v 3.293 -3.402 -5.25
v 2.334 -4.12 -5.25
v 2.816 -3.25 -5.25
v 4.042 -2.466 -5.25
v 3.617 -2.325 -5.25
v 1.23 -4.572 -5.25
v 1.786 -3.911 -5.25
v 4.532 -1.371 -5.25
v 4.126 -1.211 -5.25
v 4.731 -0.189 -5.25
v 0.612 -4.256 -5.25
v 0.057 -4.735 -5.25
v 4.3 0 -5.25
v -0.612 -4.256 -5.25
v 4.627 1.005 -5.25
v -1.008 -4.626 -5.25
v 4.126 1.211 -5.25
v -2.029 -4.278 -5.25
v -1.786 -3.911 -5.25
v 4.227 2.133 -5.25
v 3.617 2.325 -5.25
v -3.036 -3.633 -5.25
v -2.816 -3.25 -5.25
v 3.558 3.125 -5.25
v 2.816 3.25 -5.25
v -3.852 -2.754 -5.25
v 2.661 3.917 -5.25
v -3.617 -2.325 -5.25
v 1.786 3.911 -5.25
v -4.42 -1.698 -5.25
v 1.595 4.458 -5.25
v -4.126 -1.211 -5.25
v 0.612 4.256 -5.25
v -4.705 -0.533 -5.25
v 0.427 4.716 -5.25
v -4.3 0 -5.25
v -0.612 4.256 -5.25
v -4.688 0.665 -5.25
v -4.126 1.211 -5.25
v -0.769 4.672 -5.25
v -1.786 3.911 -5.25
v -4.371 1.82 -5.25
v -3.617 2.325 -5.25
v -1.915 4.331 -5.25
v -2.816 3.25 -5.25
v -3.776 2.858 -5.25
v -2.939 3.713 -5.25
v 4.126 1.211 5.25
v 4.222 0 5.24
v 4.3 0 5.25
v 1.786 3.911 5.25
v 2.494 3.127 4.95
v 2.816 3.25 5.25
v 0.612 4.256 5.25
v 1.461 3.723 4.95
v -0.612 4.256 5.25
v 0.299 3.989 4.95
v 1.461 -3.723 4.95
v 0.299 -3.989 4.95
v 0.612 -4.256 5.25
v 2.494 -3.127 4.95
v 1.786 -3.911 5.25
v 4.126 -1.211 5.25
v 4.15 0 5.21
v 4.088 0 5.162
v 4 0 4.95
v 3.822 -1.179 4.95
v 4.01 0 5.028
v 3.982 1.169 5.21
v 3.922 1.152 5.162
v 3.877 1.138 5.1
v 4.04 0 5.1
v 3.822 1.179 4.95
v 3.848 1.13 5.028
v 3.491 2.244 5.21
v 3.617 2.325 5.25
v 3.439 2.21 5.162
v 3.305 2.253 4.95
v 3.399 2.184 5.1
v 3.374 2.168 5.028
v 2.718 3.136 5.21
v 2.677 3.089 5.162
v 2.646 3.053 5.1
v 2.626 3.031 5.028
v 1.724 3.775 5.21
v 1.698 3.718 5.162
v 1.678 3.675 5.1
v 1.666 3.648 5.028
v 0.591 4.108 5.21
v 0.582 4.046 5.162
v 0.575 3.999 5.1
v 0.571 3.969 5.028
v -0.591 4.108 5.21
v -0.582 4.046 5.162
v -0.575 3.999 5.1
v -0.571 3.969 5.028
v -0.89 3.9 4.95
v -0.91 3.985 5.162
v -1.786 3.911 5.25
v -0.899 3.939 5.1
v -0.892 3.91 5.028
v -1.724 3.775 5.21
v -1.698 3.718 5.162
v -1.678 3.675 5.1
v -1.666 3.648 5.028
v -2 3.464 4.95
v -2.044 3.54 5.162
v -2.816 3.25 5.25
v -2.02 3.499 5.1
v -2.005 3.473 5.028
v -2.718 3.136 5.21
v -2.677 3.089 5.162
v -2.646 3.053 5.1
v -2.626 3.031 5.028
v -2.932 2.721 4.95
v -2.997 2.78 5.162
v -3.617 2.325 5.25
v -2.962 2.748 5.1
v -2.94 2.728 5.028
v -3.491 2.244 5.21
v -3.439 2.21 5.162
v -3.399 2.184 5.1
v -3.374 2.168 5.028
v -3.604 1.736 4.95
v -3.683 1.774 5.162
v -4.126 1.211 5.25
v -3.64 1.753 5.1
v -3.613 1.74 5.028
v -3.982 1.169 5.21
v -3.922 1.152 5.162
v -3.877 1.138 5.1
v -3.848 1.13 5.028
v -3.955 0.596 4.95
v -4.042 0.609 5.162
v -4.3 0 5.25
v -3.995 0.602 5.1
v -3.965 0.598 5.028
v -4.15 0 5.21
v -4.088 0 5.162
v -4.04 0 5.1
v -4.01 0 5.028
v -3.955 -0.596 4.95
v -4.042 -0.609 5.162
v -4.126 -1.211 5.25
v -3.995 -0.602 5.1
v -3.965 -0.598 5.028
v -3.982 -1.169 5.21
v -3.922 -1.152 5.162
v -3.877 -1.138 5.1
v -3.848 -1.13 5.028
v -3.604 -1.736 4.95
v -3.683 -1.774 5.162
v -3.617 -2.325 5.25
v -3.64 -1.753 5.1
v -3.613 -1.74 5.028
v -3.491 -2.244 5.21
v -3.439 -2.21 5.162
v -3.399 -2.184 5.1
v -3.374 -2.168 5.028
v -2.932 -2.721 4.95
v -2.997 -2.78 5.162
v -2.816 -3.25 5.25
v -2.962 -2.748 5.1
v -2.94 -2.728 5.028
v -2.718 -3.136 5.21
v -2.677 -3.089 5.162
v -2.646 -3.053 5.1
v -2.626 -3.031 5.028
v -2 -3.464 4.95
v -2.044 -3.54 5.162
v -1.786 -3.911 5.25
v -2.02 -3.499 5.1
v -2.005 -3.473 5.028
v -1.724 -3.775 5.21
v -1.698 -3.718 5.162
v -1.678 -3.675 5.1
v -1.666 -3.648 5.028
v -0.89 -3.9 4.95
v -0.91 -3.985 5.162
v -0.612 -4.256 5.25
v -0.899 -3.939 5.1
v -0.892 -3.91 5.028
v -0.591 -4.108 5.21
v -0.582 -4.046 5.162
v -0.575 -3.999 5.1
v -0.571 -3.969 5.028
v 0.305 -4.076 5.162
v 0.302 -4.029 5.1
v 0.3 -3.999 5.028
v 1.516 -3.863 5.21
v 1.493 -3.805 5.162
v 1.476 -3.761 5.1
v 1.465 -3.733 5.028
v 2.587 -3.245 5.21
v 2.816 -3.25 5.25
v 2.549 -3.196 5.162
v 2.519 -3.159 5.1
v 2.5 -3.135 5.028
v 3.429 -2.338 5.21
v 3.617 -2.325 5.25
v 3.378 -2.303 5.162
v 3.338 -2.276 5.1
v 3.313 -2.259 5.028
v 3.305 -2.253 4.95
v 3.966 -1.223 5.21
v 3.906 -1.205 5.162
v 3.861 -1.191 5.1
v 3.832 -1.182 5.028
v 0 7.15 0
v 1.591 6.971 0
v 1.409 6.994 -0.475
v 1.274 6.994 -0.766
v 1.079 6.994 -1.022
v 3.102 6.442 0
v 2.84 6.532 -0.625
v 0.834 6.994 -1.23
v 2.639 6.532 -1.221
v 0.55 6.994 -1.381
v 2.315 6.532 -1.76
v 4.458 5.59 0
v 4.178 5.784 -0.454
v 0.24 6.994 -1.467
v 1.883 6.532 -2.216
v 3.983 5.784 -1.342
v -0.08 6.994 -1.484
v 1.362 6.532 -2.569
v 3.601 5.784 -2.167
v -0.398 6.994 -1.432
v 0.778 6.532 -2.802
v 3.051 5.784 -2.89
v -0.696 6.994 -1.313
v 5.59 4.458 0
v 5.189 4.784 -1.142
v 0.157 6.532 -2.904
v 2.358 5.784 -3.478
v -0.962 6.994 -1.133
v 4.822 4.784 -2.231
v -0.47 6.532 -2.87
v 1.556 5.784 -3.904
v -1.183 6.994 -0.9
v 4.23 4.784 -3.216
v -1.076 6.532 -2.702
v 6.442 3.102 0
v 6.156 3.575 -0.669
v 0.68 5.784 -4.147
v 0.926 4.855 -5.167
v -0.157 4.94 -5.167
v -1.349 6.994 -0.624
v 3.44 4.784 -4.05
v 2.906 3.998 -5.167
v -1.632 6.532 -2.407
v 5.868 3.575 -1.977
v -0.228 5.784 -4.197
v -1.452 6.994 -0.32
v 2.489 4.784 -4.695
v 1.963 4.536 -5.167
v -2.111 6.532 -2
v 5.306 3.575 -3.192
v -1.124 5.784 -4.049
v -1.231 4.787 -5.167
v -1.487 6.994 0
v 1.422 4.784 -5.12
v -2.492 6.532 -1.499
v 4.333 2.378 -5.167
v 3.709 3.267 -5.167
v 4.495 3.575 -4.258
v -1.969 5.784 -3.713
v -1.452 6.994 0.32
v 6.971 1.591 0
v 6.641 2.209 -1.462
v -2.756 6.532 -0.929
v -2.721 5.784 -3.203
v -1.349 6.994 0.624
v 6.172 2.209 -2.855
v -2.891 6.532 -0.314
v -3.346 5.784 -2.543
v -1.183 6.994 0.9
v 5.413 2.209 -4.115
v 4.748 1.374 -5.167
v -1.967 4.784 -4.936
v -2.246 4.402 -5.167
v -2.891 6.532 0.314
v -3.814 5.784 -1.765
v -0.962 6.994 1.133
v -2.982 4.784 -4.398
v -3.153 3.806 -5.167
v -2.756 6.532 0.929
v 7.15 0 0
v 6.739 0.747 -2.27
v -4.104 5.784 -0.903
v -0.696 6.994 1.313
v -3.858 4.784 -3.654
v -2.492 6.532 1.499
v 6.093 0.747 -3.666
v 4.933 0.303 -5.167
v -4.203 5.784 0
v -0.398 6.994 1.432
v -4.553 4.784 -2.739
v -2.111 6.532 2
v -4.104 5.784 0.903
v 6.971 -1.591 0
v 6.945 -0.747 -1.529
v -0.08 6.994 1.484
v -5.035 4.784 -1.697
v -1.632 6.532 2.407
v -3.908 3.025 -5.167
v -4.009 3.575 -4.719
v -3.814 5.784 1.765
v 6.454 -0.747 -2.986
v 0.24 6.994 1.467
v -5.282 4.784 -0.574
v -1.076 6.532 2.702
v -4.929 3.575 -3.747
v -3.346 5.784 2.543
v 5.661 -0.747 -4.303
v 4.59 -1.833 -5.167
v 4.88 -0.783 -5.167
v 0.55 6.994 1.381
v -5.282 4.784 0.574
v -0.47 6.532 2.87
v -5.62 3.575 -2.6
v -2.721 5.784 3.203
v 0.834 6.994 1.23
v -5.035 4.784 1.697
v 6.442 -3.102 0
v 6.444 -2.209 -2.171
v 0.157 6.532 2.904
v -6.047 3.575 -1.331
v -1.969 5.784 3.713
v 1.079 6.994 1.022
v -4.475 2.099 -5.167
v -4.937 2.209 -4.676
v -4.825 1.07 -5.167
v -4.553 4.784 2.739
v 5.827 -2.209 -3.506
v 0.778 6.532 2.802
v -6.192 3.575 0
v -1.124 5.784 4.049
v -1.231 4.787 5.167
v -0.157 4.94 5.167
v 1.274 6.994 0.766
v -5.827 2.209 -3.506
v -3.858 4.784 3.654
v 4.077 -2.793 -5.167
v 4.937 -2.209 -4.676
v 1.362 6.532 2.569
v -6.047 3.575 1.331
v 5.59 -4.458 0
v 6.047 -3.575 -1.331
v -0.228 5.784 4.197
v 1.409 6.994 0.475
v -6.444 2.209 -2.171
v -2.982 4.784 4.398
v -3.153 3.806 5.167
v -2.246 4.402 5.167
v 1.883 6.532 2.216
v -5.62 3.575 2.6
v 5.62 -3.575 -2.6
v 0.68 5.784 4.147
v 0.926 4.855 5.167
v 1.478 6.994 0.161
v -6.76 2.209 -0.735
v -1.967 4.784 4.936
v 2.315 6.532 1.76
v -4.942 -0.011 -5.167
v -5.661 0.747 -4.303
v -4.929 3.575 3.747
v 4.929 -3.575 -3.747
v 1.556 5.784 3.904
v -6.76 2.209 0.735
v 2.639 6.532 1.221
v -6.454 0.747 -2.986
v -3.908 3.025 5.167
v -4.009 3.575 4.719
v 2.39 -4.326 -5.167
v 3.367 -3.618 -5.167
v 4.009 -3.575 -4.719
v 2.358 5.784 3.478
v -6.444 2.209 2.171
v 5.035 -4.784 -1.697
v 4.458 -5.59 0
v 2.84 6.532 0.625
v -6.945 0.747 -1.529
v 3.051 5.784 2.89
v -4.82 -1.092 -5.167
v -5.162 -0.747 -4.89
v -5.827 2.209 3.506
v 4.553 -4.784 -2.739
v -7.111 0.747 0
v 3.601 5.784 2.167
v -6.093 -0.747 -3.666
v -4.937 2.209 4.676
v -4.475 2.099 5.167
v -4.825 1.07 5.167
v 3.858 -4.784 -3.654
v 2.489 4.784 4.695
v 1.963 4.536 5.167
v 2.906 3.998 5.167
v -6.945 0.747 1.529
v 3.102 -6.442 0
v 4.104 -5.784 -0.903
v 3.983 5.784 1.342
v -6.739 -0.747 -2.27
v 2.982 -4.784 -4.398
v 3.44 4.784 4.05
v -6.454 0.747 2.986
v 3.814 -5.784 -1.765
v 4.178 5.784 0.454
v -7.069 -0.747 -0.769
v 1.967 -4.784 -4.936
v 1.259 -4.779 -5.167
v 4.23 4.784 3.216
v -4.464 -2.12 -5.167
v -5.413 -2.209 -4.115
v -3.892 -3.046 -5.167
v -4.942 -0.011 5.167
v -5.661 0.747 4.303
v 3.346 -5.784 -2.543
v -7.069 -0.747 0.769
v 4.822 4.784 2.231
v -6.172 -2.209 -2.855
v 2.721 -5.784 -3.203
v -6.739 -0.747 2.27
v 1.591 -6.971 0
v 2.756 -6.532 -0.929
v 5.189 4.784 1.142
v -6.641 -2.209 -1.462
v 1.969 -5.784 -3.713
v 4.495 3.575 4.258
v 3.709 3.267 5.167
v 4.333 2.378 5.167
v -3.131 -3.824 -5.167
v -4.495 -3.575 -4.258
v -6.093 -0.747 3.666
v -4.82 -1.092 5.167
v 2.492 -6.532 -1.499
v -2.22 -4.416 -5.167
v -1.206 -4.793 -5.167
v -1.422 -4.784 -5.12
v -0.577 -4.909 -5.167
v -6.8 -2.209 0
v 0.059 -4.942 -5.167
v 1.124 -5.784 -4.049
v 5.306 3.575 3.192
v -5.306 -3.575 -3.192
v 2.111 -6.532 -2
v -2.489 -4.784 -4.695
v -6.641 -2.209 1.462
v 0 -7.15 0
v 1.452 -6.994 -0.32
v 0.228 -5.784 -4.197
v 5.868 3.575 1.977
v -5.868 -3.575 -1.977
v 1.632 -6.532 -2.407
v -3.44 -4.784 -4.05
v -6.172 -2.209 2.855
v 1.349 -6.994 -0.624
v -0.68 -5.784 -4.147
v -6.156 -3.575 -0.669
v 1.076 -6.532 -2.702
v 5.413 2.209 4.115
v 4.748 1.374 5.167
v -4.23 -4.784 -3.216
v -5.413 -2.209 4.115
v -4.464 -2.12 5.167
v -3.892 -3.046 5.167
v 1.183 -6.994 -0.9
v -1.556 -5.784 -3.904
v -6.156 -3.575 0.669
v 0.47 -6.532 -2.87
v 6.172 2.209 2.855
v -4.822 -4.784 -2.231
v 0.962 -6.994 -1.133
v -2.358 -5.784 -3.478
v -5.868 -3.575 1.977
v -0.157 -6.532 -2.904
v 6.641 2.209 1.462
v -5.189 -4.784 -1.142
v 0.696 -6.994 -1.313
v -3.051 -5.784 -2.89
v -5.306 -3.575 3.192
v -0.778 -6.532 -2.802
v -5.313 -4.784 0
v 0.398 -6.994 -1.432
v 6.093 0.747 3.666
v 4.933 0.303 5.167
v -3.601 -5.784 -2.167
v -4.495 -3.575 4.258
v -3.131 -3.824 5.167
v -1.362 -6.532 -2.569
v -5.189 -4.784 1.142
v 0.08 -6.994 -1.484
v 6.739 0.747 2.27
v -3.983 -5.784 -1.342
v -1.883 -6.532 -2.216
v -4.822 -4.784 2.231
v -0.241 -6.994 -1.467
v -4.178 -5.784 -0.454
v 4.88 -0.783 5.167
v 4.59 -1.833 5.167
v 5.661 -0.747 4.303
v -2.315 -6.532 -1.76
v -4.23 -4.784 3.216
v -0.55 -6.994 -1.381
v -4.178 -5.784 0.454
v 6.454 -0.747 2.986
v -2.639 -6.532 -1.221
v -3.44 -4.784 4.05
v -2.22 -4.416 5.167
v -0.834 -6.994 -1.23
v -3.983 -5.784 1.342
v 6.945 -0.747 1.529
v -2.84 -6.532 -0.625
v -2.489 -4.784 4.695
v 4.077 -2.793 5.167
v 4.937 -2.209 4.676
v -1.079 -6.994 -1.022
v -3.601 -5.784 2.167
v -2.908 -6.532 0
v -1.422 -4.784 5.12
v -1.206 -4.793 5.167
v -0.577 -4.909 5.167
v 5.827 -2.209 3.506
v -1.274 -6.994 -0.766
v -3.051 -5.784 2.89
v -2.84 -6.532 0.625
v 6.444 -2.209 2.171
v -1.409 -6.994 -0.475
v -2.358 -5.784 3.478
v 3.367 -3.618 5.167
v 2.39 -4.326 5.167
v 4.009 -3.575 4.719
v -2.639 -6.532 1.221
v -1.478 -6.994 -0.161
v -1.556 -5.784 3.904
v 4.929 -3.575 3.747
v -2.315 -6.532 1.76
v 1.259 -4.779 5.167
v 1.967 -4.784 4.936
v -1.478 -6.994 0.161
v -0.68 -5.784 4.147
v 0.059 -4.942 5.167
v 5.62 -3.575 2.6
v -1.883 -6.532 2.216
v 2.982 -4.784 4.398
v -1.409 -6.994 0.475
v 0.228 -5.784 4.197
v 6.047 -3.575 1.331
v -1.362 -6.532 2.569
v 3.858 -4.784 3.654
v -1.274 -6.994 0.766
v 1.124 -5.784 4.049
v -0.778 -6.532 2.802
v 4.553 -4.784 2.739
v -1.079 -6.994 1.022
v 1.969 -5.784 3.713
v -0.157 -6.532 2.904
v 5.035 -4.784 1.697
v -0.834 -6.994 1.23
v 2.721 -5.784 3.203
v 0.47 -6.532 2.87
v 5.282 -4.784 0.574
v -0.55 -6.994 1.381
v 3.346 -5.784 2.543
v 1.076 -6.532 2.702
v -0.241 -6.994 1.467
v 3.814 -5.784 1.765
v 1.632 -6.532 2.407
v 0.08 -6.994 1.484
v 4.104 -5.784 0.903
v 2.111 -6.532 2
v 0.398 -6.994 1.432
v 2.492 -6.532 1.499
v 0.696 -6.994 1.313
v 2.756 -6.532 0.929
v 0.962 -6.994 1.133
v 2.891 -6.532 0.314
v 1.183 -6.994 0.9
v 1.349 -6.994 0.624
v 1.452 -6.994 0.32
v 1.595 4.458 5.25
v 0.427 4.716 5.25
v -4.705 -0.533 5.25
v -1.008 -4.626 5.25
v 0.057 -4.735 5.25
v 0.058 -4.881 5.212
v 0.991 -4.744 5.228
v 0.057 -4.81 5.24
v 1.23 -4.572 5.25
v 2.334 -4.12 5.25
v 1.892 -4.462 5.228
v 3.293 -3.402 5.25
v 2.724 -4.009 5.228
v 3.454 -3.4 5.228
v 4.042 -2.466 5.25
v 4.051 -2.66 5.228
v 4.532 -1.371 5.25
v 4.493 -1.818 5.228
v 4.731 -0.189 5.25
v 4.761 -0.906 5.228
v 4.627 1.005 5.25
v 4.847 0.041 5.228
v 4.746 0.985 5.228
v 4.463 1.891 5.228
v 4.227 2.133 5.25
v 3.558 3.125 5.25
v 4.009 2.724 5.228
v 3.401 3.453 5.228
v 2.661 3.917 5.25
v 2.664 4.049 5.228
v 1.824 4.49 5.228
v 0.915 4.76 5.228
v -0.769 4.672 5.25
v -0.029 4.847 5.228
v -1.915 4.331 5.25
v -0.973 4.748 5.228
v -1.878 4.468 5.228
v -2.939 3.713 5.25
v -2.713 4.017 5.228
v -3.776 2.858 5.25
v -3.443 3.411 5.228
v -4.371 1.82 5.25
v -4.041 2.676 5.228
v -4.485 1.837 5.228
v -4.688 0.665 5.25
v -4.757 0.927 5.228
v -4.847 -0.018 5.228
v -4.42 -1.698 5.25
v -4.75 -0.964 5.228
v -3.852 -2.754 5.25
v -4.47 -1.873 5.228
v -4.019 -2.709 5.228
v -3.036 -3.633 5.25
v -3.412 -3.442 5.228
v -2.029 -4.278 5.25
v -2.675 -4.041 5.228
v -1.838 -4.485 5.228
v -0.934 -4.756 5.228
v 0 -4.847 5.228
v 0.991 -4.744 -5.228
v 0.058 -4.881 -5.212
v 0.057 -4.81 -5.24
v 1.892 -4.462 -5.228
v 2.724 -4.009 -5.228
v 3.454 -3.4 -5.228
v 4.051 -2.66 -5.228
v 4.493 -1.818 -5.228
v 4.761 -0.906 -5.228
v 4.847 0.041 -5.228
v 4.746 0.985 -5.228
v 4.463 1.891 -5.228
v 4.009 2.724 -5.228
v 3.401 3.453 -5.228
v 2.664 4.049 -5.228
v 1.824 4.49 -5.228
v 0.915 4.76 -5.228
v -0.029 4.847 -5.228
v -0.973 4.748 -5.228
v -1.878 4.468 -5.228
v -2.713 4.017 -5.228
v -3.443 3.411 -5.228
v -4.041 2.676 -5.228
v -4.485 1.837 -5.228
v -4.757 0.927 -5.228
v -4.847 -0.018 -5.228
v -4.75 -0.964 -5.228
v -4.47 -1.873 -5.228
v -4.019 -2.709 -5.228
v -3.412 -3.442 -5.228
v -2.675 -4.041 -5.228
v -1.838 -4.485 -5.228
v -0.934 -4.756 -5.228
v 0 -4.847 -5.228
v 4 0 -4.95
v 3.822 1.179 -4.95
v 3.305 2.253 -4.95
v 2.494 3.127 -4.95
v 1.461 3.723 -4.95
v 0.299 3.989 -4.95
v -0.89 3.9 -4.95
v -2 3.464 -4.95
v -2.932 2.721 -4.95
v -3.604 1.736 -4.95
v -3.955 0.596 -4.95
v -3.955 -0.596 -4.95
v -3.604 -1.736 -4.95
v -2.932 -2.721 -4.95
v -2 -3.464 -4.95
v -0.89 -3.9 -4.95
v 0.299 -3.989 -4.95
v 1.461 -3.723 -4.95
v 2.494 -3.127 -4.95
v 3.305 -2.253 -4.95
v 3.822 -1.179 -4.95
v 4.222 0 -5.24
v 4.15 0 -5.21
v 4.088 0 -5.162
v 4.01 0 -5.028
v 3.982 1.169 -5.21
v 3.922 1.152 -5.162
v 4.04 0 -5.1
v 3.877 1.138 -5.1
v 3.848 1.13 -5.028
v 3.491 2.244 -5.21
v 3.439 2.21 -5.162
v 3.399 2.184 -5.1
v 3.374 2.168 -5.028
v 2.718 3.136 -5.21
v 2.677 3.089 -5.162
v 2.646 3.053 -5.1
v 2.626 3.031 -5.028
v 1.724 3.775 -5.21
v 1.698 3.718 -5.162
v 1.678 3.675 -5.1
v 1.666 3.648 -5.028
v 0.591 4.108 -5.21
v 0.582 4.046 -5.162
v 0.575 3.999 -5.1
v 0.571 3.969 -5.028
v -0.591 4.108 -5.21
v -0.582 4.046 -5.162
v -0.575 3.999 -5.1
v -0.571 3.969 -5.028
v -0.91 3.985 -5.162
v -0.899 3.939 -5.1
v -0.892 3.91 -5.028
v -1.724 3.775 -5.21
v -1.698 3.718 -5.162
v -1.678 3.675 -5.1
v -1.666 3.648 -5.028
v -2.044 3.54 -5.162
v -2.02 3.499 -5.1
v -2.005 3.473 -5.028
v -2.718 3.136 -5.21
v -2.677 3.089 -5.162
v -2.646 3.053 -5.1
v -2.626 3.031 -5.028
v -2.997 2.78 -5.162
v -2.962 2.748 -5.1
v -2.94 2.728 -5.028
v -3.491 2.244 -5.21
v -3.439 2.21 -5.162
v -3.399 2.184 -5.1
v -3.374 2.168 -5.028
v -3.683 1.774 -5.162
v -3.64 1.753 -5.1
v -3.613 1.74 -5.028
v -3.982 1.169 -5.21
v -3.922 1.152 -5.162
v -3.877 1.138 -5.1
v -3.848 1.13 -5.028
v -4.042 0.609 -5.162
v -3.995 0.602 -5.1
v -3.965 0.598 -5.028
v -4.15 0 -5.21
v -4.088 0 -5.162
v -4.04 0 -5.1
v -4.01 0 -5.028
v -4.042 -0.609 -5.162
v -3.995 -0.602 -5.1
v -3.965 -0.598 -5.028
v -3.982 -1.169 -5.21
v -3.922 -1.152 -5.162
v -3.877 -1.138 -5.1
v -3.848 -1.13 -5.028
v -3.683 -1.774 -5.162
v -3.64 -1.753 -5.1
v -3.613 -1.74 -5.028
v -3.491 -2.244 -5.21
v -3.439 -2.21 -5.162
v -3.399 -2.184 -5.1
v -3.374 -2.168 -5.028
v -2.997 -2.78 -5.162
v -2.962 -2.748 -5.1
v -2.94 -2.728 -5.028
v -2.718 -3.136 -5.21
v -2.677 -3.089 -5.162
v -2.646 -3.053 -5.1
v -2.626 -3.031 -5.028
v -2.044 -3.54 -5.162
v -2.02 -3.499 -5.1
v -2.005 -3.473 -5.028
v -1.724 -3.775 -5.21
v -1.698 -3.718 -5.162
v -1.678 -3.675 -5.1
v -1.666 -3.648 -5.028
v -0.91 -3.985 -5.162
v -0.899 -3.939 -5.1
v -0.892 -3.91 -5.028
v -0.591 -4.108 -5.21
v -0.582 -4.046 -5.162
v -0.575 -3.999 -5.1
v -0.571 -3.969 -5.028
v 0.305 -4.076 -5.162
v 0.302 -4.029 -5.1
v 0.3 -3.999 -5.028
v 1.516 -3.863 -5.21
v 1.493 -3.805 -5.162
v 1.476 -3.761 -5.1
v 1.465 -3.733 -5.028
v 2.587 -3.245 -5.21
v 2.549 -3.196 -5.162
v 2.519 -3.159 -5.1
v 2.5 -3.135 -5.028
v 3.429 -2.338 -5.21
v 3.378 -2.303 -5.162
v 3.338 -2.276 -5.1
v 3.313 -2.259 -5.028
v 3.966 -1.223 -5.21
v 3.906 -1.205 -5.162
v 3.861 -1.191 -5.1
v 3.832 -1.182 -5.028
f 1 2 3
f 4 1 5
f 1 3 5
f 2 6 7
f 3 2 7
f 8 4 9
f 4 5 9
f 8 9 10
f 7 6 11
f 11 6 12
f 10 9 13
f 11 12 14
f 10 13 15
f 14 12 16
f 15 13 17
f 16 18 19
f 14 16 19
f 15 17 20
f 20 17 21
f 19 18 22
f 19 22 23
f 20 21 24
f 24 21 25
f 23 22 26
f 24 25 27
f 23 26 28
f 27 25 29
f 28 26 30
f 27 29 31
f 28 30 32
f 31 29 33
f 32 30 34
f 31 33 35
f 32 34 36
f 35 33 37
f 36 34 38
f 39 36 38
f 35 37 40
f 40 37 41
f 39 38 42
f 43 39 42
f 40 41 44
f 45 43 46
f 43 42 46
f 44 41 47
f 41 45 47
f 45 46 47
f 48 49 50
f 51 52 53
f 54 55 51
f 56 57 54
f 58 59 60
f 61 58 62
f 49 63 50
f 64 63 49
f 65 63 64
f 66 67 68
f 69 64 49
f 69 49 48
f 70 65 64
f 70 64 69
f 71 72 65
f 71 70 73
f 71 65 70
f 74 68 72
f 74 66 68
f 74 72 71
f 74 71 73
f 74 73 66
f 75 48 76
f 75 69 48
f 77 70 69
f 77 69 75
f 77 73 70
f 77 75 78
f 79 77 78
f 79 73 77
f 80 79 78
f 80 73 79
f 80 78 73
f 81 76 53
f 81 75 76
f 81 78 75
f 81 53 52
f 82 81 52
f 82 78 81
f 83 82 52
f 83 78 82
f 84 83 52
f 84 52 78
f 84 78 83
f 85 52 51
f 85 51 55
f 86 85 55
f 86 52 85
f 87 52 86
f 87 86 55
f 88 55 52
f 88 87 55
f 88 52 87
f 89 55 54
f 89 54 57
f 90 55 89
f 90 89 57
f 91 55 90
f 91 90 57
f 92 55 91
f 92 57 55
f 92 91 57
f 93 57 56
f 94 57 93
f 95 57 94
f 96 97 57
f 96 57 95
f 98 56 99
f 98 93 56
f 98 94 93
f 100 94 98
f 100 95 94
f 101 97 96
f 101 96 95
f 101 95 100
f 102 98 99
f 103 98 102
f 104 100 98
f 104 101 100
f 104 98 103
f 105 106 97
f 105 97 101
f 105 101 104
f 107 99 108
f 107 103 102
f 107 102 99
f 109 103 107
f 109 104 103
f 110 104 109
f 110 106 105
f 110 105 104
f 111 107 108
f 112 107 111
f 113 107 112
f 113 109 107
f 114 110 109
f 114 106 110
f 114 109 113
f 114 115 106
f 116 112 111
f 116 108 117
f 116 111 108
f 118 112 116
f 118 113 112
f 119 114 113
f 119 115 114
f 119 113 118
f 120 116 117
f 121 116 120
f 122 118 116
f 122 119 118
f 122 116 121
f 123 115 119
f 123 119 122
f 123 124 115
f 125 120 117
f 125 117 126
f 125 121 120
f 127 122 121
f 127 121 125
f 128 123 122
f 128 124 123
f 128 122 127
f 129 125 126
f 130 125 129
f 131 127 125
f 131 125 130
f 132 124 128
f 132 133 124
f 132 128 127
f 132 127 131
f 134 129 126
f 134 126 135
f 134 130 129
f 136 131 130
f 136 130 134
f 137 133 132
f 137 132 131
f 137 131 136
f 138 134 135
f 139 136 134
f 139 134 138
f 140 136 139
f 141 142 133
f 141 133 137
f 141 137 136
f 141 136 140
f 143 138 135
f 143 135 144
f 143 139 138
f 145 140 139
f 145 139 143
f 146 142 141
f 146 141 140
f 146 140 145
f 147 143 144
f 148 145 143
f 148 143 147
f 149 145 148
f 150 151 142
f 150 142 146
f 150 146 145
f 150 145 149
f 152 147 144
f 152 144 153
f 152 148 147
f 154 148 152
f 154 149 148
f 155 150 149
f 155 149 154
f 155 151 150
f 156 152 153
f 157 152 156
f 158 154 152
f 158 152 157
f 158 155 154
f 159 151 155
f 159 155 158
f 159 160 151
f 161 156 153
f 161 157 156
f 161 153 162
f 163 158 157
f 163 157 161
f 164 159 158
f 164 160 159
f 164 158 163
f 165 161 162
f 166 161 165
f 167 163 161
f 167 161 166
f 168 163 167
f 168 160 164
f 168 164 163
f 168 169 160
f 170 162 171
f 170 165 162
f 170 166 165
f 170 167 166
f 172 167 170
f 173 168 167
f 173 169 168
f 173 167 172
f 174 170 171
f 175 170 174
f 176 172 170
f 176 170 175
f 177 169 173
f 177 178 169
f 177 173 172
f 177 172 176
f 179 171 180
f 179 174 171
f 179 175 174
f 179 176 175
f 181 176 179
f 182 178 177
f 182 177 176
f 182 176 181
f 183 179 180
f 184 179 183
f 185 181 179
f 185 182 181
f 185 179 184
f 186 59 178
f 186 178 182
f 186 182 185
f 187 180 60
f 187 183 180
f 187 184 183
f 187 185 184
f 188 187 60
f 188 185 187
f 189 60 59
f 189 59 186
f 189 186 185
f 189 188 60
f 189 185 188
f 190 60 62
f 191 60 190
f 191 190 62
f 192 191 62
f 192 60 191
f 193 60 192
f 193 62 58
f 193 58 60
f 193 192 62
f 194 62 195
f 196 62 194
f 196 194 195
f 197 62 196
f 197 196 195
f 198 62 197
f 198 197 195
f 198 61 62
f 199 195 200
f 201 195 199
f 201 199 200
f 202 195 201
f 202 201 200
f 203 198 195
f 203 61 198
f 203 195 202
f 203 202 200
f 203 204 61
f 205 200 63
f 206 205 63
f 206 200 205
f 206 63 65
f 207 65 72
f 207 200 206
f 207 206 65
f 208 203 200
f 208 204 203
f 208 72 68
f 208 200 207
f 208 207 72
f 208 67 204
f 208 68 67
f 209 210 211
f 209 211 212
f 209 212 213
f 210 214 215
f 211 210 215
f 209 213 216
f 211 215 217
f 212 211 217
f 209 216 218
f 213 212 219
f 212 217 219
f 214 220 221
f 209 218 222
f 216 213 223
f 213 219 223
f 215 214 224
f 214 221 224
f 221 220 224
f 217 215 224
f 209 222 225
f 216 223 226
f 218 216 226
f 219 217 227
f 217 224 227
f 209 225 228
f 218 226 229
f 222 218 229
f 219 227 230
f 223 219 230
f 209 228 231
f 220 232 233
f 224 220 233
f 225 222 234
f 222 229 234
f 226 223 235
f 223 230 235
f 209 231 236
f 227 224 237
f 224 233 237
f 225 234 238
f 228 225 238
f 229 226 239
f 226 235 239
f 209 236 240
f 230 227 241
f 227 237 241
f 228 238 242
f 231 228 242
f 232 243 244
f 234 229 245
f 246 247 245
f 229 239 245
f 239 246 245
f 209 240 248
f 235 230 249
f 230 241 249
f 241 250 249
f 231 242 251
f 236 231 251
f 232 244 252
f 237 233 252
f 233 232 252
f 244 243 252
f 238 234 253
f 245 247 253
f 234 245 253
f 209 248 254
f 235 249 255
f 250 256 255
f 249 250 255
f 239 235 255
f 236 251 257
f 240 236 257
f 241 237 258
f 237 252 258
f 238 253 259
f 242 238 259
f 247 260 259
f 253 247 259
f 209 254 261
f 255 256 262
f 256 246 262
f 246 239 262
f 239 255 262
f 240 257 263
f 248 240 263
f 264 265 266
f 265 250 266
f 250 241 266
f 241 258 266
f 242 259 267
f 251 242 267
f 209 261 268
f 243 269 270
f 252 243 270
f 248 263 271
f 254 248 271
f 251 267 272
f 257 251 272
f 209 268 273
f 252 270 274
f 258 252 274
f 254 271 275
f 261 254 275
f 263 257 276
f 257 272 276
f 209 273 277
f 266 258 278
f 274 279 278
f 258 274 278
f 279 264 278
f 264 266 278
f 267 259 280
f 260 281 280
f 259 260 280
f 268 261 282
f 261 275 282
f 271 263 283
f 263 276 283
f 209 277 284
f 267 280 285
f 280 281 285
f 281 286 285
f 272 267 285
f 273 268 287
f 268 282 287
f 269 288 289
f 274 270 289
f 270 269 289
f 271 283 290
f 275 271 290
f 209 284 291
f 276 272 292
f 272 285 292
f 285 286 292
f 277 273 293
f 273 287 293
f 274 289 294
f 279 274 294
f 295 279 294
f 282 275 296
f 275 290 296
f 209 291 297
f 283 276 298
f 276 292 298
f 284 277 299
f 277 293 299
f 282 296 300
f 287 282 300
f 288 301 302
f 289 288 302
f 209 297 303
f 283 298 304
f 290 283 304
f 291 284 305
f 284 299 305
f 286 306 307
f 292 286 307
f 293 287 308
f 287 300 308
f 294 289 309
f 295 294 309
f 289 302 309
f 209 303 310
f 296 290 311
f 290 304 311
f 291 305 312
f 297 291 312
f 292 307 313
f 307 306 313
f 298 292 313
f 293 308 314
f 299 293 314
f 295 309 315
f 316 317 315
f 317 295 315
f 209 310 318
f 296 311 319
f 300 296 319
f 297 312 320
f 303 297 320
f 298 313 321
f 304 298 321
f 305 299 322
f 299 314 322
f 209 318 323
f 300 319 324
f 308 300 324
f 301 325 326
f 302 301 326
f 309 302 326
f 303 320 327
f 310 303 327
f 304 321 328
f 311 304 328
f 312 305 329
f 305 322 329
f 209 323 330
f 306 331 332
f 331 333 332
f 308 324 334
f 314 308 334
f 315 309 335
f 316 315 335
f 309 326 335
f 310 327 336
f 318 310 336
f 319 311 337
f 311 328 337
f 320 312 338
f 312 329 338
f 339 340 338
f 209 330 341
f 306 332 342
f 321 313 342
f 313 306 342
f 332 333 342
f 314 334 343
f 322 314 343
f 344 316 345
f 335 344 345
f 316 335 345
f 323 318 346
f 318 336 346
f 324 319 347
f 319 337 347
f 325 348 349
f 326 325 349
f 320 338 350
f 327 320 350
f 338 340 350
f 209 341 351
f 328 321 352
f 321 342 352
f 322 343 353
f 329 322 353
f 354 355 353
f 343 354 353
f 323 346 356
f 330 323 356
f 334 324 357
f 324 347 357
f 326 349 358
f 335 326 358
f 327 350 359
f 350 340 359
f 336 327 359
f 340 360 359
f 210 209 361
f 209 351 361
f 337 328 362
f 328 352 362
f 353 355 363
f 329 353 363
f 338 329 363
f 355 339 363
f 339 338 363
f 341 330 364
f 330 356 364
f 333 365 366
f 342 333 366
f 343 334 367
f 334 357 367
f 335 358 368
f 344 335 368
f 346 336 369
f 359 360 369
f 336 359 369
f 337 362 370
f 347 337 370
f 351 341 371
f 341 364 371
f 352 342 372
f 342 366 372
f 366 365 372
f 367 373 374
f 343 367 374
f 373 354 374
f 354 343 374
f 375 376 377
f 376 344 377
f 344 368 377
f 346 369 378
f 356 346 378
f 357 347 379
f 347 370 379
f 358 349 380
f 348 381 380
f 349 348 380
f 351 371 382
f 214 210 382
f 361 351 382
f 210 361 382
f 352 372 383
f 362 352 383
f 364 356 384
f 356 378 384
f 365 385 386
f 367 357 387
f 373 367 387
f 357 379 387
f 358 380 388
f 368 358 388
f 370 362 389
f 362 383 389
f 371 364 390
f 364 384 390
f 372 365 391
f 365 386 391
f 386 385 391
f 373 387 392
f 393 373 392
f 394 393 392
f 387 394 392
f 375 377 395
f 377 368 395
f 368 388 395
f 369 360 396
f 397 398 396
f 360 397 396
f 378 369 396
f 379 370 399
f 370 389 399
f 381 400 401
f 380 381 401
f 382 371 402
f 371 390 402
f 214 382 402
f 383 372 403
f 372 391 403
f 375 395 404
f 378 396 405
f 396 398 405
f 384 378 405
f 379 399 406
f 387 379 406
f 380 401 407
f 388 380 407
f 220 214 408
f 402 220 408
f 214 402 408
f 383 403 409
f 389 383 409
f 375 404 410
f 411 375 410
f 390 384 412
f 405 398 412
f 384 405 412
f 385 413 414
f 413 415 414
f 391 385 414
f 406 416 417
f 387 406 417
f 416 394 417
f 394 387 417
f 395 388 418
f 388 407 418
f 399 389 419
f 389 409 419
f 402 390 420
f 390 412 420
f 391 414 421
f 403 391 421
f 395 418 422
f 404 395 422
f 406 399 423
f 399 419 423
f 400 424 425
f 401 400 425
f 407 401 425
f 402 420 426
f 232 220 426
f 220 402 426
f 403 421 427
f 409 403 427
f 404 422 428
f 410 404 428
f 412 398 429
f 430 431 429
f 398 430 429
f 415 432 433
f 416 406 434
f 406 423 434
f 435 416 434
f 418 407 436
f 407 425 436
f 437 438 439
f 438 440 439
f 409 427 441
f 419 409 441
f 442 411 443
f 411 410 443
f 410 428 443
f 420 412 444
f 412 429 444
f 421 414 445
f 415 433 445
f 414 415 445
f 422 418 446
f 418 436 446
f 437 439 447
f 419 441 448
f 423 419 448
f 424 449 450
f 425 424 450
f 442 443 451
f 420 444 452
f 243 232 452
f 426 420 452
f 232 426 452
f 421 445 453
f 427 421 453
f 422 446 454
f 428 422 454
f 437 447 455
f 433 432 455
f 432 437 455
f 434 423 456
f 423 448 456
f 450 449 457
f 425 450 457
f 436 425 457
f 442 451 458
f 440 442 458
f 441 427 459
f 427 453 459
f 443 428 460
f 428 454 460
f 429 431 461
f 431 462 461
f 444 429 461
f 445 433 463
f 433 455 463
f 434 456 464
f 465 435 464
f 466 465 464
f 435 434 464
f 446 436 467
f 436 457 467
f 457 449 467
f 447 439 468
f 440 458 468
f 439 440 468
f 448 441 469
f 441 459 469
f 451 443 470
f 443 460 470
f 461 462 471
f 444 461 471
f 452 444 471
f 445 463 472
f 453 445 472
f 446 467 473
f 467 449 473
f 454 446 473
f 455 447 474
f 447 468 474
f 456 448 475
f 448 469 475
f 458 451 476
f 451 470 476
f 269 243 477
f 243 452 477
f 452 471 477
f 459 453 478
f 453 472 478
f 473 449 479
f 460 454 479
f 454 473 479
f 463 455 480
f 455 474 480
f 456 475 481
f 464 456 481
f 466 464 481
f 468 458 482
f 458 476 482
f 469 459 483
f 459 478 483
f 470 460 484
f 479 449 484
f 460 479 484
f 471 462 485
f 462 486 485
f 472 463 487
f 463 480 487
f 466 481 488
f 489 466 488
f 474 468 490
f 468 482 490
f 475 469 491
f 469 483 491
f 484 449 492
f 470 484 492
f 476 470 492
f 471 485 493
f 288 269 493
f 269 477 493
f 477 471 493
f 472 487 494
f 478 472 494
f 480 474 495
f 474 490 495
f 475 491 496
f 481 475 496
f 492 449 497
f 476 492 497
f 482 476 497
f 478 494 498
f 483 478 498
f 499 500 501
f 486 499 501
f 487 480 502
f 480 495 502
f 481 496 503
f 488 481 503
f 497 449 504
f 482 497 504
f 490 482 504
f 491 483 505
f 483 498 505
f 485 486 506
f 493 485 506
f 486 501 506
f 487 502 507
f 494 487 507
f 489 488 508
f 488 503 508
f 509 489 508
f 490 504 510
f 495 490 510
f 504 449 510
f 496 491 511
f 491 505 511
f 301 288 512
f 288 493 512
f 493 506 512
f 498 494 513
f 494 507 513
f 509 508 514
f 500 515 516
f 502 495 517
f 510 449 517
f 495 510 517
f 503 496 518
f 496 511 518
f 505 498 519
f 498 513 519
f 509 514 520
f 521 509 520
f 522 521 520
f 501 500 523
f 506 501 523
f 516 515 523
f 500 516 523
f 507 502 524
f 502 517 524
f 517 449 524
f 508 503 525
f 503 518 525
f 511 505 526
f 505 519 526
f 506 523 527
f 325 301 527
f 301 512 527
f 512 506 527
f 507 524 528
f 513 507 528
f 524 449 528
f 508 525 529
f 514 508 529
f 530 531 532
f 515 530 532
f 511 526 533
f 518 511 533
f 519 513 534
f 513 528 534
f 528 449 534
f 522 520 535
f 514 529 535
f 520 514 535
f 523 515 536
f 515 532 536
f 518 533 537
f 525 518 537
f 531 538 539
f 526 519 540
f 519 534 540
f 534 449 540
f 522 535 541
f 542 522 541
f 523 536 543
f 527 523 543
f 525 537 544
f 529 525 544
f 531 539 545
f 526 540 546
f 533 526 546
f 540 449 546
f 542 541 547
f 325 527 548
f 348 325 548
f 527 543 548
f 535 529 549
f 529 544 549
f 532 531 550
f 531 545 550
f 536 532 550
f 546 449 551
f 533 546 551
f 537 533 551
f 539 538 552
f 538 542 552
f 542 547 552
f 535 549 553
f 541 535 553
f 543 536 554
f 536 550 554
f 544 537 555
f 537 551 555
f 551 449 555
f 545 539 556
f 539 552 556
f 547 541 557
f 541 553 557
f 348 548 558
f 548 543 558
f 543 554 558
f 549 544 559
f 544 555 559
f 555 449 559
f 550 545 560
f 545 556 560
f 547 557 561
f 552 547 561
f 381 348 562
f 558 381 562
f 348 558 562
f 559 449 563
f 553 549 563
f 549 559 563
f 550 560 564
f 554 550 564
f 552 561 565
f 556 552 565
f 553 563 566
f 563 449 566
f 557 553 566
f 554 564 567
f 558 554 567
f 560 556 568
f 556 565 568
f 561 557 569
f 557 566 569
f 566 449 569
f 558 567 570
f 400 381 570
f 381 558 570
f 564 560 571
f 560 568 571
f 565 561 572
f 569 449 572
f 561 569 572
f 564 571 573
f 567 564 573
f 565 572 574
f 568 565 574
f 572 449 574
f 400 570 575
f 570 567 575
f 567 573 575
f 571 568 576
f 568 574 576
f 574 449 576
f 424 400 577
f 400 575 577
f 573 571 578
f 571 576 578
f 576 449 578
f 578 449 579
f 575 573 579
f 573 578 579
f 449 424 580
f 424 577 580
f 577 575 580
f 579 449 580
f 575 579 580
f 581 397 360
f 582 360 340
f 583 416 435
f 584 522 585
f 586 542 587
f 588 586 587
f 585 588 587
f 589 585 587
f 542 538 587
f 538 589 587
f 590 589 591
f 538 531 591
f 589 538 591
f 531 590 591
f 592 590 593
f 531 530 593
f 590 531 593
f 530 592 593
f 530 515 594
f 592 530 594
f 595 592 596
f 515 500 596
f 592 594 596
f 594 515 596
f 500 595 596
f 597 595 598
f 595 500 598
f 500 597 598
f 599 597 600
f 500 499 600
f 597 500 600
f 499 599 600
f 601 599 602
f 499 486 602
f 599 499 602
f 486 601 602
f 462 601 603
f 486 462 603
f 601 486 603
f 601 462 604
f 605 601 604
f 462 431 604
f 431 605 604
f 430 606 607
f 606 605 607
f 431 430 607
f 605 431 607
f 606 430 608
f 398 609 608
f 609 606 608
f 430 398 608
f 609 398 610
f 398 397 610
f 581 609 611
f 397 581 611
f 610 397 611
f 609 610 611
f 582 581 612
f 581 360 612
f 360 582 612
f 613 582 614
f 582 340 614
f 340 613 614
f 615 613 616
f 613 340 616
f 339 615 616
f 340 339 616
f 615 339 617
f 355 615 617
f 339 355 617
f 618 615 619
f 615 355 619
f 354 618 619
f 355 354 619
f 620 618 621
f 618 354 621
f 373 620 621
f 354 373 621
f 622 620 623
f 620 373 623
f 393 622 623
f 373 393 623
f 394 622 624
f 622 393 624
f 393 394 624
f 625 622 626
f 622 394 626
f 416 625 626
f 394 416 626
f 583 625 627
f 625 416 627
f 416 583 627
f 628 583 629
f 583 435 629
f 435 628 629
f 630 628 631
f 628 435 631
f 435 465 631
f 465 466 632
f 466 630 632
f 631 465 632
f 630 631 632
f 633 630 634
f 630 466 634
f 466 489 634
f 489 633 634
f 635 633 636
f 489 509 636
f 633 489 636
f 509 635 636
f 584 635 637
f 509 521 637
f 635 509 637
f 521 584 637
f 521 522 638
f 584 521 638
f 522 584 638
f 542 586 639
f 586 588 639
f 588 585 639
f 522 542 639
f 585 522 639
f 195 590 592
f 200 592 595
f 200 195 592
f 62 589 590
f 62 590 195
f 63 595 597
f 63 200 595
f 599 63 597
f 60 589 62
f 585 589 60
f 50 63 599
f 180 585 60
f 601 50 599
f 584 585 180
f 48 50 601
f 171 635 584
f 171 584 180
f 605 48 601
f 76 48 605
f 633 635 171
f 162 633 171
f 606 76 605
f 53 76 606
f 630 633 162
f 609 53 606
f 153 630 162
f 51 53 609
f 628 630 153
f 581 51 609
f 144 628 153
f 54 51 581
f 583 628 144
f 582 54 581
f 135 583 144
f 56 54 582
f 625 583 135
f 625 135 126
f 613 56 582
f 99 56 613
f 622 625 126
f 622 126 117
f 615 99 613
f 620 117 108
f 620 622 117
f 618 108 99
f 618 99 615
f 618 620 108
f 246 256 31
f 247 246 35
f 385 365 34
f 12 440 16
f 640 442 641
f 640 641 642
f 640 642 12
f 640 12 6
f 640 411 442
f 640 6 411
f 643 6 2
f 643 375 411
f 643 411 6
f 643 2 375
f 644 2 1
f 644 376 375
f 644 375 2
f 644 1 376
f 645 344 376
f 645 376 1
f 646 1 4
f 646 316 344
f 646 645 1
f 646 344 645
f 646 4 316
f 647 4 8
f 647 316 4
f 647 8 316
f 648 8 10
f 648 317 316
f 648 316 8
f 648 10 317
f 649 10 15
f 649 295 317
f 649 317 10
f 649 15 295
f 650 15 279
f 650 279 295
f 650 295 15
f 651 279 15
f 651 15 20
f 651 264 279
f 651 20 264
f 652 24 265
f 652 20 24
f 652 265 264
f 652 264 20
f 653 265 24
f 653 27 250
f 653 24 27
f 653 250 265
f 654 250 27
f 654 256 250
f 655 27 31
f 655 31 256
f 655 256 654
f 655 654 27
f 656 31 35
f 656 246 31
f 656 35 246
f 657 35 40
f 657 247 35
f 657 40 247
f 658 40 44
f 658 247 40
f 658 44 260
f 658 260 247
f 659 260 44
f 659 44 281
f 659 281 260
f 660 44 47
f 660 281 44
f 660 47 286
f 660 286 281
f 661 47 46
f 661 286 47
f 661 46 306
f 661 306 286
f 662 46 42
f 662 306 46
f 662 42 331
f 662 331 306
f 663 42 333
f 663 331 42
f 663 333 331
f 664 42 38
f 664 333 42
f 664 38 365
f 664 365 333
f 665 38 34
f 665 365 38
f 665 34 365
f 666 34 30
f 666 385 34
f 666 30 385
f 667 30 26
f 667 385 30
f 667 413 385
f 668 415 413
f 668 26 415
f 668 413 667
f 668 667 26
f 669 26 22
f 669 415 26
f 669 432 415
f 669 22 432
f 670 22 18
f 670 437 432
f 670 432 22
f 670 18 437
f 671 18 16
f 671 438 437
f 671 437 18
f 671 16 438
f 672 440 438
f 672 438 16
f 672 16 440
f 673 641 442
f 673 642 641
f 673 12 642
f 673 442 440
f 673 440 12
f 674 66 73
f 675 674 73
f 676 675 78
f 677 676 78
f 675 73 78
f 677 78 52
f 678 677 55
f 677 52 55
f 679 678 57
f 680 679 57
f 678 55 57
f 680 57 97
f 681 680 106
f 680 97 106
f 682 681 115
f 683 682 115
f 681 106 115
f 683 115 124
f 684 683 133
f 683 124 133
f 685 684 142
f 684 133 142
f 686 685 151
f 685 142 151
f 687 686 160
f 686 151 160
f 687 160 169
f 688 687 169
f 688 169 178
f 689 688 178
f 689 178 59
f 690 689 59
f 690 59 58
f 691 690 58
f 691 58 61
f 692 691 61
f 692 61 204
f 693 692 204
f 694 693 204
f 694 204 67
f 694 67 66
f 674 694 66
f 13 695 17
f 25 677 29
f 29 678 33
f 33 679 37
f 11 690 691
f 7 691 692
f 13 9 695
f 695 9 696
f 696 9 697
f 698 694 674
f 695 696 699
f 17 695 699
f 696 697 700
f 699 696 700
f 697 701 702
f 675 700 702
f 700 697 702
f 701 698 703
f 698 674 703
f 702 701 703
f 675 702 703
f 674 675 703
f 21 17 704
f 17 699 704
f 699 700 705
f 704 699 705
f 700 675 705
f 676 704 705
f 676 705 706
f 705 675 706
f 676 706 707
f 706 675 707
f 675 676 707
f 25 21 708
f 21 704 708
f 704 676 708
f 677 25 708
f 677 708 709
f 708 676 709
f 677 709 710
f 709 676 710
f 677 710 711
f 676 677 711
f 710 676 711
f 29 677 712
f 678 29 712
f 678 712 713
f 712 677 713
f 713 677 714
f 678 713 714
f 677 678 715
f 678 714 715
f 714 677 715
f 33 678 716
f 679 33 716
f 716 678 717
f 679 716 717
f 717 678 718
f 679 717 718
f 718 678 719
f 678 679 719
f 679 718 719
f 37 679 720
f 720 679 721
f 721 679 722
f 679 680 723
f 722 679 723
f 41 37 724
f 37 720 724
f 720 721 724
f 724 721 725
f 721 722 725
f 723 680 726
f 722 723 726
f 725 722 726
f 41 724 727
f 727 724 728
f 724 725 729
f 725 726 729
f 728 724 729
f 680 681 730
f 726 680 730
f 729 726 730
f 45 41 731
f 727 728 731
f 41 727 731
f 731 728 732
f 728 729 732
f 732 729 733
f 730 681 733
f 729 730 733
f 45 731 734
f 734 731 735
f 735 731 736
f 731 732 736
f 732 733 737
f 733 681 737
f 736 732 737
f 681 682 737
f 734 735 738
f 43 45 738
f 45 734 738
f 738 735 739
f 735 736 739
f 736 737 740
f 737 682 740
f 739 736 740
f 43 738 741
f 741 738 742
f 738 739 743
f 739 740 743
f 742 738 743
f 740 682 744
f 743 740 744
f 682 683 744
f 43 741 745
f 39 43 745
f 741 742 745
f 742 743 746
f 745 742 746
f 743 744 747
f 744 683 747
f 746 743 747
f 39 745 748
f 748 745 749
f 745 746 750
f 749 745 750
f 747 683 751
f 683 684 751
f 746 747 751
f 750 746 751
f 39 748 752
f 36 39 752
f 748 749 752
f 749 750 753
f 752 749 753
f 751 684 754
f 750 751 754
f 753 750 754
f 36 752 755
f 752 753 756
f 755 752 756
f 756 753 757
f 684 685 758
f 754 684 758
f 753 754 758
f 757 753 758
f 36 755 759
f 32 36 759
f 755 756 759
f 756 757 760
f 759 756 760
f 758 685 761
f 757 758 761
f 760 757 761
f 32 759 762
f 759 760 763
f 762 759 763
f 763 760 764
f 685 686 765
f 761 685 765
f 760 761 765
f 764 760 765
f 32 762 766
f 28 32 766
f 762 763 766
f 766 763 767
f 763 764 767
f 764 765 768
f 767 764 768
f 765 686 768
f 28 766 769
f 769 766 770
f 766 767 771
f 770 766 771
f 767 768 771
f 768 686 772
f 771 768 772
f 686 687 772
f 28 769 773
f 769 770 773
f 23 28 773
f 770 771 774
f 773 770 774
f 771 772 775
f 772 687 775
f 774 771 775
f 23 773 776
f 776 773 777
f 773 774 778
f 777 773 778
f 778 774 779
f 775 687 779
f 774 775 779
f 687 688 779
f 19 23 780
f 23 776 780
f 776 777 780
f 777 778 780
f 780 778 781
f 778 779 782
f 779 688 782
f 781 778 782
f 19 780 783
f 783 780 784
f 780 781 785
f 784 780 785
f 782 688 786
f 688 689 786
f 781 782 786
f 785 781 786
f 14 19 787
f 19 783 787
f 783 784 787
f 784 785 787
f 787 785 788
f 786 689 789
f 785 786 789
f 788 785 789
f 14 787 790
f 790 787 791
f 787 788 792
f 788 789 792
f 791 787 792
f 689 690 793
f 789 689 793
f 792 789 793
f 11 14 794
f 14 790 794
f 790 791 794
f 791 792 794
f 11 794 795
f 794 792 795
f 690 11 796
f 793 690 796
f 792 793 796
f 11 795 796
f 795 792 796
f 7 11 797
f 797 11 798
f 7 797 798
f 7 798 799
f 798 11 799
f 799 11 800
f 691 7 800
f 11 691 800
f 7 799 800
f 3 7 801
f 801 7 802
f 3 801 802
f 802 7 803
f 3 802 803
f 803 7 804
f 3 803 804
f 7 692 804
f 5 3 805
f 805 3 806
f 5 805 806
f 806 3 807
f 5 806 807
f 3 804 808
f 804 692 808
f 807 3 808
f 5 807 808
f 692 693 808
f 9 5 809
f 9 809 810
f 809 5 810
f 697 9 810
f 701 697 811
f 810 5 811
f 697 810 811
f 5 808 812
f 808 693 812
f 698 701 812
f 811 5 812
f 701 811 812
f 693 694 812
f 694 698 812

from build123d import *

# Parameters (mm, degrees)
CORTE_EXTRUS_O1_DEPTH      = 25.768326548
CORTE_EXTRUS_O1_DEPTH_BACK = 25.768326548
ESBO_O2_W                  = 15
ESBO_O2_H                  = 30
ESBO_O3_R                  = 8
CORTE_EXTRUS_O2_DEPTH      = 33.000312498
FILETE1_R                  = 0.6
SCALE1_SCALE               = 0.5


with BuildPart() as part:
    # Esboço1 → Revolução1 (revolve)
    with BuildSketch(Plane.XY):
        with BuildLine():
            Line((0, -14.3), (0, 14.3))
            ThreePointArc((0, 14.3), (14.3, 0), (0, -14.3))
        make_face()
    revolve(axis=Axis((0, -14.3, 0), (0, 1, 0)))

    # Esboço2 → Corte-extrusão1 (cut, two sides: drawn at the far end of the back side and taken through both)
    with BuildSketch(Plane(origin=(0, 0, 0), x_dir=(0, 0, -1), z_dir=(1, 0, 0)).offset(-CORTE_EXTRUS_O1_DEPTH_BACK)):
        with Locations((-18, 0)):
            Rectangle(ESBO_O2_W, ESBO_O2_H)
        with Locations((18, 0)):
            Rectangle(ESBO_O2_W, ESBO_O2_H)
    extrude(amount=CORTE_EXTRUS_O1_DEPTH + CORTE_EXTRUS_O1_DEPTH_BACK, mode=Mode.SUBTRACT)

    # Esboço3 → Corte-extrusão2 (cut, through all)
    with BuildSketch(Plane.XY.offset(10.5)):
        Circle(ESBO_O3_R)
    extrude(amount=-CORTE_EXTRUS_O2_DEPTH, mode=Mode.SUBTRACT)

    # Filete1
    filete1_edges = [part.edges().sort_by_distance(p)[0] for p in [
        (0, 9.70772888, -10.5),
        (-8, 0, -10.5),
        (-8, 0, 10.5),
        (0, 9.70772888, 10.5),
    ]]
    fillet(filete1_edges, radius=FILETE1_R)


with BuildPart() as part_1:
    # Scale1: scaled about (-1.207e-06, 2.588e-06, 0)
    add(part.part.scale(SCALE1_SCALE).moved(Location((-6.04e-07, 1.294e-06, 0))))


solid = part_1.part
